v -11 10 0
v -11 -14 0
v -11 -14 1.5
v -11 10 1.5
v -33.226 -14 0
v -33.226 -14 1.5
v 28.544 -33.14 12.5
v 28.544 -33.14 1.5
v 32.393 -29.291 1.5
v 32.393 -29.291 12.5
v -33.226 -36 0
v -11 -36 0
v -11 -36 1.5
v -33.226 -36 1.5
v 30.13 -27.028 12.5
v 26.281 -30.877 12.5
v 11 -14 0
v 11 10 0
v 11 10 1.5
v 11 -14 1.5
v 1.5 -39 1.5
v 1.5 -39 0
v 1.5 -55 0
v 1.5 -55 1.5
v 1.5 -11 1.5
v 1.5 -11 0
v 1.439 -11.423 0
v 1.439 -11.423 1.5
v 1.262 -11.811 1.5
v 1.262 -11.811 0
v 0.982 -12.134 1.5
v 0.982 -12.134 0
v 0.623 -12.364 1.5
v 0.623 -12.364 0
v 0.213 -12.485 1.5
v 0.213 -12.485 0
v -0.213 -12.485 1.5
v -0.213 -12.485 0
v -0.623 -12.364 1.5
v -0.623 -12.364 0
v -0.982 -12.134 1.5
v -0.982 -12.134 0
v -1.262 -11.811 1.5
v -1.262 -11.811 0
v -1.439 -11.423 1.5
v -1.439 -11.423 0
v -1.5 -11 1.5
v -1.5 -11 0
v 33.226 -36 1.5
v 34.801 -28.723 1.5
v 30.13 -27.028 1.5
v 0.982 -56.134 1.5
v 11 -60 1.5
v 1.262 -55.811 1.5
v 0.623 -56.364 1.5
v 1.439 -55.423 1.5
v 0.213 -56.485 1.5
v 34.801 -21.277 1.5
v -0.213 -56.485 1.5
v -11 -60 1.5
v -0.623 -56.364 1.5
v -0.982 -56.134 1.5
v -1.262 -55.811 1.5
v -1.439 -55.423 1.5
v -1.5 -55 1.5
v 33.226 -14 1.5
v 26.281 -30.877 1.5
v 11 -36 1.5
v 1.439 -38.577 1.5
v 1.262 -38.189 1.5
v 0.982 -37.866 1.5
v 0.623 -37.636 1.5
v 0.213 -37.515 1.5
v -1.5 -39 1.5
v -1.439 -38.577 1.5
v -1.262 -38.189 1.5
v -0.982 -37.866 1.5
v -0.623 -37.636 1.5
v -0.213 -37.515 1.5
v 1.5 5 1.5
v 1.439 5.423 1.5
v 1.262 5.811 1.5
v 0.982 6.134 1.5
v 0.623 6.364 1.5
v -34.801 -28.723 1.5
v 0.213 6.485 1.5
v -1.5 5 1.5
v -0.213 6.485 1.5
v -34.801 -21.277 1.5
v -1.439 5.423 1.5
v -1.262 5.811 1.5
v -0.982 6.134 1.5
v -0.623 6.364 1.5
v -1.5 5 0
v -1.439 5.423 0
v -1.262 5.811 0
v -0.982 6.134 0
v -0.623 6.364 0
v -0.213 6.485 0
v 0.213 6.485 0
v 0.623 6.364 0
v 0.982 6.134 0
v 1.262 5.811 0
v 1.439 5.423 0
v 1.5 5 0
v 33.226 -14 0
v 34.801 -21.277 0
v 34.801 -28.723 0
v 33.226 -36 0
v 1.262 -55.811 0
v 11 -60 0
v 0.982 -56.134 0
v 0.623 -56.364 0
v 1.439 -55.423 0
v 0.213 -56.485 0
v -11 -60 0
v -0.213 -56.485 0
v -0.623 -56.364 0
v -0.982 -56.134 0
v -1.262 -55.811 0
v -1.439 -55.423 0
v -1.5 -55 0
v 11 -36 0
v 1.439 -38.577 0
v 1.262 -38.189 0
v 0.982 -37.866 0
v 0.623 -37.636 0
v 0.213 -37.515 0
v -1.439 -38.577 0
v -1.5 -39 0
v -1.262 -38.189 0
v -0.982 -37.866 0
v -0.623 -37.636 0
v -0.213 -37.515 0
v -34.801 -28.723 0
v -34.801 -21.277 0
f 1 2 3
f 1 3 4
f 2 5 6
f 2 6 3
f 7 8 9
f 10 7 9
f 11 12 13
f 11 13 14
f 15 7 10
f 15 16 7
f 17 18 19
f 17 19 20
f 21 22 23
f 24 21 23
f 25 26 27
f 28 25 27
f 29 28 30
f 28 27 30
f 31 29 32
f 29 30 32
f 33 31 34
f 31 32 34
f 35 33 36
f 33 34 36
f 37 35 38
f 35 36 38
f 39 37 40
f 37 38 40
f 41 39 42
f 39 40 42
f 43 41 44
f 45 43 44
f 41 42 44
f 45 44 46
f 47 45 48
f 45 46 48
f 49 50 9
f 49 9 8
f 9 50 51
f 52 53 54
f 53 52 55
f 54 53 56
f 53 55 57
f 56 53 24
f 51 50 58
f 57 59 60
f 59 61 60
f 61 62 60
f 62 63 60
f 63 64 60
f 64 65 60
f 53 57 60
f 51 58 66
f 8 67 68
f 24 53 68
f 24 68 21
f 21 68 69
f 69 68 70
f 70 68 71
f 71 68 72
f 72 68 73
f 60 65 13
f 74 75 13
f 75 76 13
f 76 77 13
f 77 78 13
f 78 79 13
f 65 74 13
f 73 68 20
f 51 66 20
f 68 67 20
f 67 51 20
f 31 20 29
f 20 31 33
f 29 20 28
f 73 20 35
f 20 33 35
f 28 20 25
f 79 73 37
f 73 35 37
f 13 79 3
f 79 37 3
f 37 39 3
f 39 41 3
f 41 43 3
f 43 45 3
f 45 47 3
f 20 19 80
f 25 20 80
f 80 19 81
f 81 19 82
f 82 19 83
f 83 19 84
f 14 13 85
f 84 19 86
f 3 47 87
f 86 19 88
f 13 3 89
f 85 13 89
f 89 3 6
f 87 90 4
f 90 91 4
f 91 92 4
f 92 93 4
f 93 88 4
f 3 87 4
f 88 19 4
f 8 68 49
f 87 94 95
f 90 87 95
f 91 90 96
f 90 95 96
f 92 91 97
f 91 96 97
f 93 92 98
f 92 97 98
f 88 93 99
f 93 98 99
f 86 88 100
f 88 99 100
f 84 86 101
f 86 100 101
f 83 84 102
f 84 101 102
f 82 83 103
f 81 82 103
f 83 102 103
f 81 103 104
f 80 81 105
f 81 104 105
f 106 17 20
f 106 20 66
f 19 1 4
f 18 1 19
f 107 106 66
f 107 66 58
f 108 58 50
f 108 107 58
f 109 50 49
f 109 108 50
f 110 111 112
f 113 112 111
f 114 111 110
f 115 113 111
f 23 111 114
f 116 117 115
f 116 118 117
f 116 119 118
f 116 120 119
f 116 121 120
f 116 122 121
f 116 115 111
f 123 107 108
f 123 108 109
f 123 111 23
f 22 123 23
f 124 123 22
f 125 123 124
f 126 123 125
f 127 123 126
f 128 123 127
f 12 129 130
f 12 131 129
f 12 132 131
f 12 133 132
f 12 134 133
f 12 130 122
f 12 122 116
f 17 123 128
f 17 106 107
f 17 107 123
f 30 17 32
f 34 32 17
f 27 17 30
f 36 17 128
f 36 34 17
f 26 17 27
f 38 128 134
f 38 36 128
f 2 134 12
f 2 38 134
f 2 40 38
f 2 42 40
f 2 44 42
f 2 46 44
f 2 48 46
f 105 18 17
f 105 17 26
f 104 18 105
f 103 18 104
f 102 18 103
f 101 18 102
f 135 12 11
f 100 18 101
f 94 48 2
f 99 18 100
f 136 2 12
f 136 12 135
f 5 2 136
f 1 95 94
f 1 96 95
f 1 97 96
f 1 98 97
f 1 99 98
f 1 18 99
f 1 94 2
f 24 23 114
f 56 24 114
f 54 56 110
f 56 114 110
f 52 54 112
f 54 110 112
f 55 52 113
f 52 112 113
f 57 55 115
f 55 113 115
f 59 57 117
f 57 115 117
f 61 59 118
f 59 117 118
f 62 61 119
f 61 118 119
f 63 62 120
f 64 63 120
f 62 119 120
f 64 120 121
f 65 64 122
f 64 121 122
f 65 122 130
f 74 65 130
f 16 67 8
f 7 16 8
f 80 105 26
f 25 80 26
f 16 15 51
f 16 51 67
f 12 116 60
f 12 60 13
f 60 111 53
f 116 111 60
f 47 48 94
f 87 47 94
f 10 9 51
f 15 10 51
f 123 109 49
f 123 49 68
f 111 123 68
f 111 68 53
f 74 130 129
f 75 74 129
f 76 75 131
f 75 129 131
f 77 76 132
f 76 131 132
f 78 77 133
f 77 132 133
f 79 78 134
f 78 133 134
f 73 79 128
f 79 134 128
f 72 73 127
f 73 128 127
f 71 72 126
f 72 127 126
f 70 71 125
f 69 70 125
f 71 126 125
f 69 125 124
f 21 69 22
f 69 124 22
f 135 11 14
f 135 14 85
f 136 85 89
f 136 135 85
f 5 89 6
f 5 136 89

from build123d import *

# Parameters (mm, degrees)
BOSS_EXTRU_1_DEPTH = 1.5
BOSS_EXTRU_2_DEPTH = 11


with BuildPart() as part:
    # Esquisse1 → Boss.-Extru.1 (new body)
    with BuildSketch(Plane.XY):
        with BuildLine():
            Line((-11, 10), (11, 10))
            Line((11, 10), (11, -14))
            Line((11, -14), (33.226495452, -14))
            ThreePointArc((33.226495452, -14), (35, -25), (33.226495452, -36))
            Line((33.226495452, -36), (11, -36))
            Line((11, -36), (11, -60))
            Line((11, -60), (-11, -60))
            Line((-11, -60), (-11, -36))
            Line((-11, -36), (-33.226495452, -36))
            ThreePointArc((-33.226495452, -36), (-35, -25), (-33.226495452, -14))
            Line((-33.226495452, -14), (-11, -14))
            Line((-11, -14), (-11, 10))
        make_face()
        with BuildLine():
            Line((1.5, 5), (1.5, -11))
            ThreePointArc((1.5, -11), (0, -12.5), (-1.5, -11))
            Line((-1.5, -11), (-1.5, 5))
            ThreePointArc((-1.5, 5), (0, 6.5), (1.5, 5))
        make_face(mode=Mode.SUBTRACT)
        with BuildLine():
            Line((1.5, -39), (1.5, -55))
            ThreePointArc((1.5, -55), (0, -56.5), (-1.5, -55))
            Line((-1.5, -55), (-1.5, -39))
            ThreePointArc((-1.5, -39), (0, -37.5), (1.5, -39))
        make_face(mode=Mode.SUBTRACT)
    extrude(amount=BOSS_EXTRU_1_DEPTH)

    # Esquisse3 → Boss.-Extru.2 (add)
    with BuildSketch(Plane.XY.offset(1.5)):
        Polygon((28.544164415, -33.139950571), (32.392821374, -29.291293612), (30.12954231, -27.028014548), (26.280885351, -30.876671507), align=None)
    extrude(amount=BOSS_EXTRU_2_DEPTH)


solid = part.part
